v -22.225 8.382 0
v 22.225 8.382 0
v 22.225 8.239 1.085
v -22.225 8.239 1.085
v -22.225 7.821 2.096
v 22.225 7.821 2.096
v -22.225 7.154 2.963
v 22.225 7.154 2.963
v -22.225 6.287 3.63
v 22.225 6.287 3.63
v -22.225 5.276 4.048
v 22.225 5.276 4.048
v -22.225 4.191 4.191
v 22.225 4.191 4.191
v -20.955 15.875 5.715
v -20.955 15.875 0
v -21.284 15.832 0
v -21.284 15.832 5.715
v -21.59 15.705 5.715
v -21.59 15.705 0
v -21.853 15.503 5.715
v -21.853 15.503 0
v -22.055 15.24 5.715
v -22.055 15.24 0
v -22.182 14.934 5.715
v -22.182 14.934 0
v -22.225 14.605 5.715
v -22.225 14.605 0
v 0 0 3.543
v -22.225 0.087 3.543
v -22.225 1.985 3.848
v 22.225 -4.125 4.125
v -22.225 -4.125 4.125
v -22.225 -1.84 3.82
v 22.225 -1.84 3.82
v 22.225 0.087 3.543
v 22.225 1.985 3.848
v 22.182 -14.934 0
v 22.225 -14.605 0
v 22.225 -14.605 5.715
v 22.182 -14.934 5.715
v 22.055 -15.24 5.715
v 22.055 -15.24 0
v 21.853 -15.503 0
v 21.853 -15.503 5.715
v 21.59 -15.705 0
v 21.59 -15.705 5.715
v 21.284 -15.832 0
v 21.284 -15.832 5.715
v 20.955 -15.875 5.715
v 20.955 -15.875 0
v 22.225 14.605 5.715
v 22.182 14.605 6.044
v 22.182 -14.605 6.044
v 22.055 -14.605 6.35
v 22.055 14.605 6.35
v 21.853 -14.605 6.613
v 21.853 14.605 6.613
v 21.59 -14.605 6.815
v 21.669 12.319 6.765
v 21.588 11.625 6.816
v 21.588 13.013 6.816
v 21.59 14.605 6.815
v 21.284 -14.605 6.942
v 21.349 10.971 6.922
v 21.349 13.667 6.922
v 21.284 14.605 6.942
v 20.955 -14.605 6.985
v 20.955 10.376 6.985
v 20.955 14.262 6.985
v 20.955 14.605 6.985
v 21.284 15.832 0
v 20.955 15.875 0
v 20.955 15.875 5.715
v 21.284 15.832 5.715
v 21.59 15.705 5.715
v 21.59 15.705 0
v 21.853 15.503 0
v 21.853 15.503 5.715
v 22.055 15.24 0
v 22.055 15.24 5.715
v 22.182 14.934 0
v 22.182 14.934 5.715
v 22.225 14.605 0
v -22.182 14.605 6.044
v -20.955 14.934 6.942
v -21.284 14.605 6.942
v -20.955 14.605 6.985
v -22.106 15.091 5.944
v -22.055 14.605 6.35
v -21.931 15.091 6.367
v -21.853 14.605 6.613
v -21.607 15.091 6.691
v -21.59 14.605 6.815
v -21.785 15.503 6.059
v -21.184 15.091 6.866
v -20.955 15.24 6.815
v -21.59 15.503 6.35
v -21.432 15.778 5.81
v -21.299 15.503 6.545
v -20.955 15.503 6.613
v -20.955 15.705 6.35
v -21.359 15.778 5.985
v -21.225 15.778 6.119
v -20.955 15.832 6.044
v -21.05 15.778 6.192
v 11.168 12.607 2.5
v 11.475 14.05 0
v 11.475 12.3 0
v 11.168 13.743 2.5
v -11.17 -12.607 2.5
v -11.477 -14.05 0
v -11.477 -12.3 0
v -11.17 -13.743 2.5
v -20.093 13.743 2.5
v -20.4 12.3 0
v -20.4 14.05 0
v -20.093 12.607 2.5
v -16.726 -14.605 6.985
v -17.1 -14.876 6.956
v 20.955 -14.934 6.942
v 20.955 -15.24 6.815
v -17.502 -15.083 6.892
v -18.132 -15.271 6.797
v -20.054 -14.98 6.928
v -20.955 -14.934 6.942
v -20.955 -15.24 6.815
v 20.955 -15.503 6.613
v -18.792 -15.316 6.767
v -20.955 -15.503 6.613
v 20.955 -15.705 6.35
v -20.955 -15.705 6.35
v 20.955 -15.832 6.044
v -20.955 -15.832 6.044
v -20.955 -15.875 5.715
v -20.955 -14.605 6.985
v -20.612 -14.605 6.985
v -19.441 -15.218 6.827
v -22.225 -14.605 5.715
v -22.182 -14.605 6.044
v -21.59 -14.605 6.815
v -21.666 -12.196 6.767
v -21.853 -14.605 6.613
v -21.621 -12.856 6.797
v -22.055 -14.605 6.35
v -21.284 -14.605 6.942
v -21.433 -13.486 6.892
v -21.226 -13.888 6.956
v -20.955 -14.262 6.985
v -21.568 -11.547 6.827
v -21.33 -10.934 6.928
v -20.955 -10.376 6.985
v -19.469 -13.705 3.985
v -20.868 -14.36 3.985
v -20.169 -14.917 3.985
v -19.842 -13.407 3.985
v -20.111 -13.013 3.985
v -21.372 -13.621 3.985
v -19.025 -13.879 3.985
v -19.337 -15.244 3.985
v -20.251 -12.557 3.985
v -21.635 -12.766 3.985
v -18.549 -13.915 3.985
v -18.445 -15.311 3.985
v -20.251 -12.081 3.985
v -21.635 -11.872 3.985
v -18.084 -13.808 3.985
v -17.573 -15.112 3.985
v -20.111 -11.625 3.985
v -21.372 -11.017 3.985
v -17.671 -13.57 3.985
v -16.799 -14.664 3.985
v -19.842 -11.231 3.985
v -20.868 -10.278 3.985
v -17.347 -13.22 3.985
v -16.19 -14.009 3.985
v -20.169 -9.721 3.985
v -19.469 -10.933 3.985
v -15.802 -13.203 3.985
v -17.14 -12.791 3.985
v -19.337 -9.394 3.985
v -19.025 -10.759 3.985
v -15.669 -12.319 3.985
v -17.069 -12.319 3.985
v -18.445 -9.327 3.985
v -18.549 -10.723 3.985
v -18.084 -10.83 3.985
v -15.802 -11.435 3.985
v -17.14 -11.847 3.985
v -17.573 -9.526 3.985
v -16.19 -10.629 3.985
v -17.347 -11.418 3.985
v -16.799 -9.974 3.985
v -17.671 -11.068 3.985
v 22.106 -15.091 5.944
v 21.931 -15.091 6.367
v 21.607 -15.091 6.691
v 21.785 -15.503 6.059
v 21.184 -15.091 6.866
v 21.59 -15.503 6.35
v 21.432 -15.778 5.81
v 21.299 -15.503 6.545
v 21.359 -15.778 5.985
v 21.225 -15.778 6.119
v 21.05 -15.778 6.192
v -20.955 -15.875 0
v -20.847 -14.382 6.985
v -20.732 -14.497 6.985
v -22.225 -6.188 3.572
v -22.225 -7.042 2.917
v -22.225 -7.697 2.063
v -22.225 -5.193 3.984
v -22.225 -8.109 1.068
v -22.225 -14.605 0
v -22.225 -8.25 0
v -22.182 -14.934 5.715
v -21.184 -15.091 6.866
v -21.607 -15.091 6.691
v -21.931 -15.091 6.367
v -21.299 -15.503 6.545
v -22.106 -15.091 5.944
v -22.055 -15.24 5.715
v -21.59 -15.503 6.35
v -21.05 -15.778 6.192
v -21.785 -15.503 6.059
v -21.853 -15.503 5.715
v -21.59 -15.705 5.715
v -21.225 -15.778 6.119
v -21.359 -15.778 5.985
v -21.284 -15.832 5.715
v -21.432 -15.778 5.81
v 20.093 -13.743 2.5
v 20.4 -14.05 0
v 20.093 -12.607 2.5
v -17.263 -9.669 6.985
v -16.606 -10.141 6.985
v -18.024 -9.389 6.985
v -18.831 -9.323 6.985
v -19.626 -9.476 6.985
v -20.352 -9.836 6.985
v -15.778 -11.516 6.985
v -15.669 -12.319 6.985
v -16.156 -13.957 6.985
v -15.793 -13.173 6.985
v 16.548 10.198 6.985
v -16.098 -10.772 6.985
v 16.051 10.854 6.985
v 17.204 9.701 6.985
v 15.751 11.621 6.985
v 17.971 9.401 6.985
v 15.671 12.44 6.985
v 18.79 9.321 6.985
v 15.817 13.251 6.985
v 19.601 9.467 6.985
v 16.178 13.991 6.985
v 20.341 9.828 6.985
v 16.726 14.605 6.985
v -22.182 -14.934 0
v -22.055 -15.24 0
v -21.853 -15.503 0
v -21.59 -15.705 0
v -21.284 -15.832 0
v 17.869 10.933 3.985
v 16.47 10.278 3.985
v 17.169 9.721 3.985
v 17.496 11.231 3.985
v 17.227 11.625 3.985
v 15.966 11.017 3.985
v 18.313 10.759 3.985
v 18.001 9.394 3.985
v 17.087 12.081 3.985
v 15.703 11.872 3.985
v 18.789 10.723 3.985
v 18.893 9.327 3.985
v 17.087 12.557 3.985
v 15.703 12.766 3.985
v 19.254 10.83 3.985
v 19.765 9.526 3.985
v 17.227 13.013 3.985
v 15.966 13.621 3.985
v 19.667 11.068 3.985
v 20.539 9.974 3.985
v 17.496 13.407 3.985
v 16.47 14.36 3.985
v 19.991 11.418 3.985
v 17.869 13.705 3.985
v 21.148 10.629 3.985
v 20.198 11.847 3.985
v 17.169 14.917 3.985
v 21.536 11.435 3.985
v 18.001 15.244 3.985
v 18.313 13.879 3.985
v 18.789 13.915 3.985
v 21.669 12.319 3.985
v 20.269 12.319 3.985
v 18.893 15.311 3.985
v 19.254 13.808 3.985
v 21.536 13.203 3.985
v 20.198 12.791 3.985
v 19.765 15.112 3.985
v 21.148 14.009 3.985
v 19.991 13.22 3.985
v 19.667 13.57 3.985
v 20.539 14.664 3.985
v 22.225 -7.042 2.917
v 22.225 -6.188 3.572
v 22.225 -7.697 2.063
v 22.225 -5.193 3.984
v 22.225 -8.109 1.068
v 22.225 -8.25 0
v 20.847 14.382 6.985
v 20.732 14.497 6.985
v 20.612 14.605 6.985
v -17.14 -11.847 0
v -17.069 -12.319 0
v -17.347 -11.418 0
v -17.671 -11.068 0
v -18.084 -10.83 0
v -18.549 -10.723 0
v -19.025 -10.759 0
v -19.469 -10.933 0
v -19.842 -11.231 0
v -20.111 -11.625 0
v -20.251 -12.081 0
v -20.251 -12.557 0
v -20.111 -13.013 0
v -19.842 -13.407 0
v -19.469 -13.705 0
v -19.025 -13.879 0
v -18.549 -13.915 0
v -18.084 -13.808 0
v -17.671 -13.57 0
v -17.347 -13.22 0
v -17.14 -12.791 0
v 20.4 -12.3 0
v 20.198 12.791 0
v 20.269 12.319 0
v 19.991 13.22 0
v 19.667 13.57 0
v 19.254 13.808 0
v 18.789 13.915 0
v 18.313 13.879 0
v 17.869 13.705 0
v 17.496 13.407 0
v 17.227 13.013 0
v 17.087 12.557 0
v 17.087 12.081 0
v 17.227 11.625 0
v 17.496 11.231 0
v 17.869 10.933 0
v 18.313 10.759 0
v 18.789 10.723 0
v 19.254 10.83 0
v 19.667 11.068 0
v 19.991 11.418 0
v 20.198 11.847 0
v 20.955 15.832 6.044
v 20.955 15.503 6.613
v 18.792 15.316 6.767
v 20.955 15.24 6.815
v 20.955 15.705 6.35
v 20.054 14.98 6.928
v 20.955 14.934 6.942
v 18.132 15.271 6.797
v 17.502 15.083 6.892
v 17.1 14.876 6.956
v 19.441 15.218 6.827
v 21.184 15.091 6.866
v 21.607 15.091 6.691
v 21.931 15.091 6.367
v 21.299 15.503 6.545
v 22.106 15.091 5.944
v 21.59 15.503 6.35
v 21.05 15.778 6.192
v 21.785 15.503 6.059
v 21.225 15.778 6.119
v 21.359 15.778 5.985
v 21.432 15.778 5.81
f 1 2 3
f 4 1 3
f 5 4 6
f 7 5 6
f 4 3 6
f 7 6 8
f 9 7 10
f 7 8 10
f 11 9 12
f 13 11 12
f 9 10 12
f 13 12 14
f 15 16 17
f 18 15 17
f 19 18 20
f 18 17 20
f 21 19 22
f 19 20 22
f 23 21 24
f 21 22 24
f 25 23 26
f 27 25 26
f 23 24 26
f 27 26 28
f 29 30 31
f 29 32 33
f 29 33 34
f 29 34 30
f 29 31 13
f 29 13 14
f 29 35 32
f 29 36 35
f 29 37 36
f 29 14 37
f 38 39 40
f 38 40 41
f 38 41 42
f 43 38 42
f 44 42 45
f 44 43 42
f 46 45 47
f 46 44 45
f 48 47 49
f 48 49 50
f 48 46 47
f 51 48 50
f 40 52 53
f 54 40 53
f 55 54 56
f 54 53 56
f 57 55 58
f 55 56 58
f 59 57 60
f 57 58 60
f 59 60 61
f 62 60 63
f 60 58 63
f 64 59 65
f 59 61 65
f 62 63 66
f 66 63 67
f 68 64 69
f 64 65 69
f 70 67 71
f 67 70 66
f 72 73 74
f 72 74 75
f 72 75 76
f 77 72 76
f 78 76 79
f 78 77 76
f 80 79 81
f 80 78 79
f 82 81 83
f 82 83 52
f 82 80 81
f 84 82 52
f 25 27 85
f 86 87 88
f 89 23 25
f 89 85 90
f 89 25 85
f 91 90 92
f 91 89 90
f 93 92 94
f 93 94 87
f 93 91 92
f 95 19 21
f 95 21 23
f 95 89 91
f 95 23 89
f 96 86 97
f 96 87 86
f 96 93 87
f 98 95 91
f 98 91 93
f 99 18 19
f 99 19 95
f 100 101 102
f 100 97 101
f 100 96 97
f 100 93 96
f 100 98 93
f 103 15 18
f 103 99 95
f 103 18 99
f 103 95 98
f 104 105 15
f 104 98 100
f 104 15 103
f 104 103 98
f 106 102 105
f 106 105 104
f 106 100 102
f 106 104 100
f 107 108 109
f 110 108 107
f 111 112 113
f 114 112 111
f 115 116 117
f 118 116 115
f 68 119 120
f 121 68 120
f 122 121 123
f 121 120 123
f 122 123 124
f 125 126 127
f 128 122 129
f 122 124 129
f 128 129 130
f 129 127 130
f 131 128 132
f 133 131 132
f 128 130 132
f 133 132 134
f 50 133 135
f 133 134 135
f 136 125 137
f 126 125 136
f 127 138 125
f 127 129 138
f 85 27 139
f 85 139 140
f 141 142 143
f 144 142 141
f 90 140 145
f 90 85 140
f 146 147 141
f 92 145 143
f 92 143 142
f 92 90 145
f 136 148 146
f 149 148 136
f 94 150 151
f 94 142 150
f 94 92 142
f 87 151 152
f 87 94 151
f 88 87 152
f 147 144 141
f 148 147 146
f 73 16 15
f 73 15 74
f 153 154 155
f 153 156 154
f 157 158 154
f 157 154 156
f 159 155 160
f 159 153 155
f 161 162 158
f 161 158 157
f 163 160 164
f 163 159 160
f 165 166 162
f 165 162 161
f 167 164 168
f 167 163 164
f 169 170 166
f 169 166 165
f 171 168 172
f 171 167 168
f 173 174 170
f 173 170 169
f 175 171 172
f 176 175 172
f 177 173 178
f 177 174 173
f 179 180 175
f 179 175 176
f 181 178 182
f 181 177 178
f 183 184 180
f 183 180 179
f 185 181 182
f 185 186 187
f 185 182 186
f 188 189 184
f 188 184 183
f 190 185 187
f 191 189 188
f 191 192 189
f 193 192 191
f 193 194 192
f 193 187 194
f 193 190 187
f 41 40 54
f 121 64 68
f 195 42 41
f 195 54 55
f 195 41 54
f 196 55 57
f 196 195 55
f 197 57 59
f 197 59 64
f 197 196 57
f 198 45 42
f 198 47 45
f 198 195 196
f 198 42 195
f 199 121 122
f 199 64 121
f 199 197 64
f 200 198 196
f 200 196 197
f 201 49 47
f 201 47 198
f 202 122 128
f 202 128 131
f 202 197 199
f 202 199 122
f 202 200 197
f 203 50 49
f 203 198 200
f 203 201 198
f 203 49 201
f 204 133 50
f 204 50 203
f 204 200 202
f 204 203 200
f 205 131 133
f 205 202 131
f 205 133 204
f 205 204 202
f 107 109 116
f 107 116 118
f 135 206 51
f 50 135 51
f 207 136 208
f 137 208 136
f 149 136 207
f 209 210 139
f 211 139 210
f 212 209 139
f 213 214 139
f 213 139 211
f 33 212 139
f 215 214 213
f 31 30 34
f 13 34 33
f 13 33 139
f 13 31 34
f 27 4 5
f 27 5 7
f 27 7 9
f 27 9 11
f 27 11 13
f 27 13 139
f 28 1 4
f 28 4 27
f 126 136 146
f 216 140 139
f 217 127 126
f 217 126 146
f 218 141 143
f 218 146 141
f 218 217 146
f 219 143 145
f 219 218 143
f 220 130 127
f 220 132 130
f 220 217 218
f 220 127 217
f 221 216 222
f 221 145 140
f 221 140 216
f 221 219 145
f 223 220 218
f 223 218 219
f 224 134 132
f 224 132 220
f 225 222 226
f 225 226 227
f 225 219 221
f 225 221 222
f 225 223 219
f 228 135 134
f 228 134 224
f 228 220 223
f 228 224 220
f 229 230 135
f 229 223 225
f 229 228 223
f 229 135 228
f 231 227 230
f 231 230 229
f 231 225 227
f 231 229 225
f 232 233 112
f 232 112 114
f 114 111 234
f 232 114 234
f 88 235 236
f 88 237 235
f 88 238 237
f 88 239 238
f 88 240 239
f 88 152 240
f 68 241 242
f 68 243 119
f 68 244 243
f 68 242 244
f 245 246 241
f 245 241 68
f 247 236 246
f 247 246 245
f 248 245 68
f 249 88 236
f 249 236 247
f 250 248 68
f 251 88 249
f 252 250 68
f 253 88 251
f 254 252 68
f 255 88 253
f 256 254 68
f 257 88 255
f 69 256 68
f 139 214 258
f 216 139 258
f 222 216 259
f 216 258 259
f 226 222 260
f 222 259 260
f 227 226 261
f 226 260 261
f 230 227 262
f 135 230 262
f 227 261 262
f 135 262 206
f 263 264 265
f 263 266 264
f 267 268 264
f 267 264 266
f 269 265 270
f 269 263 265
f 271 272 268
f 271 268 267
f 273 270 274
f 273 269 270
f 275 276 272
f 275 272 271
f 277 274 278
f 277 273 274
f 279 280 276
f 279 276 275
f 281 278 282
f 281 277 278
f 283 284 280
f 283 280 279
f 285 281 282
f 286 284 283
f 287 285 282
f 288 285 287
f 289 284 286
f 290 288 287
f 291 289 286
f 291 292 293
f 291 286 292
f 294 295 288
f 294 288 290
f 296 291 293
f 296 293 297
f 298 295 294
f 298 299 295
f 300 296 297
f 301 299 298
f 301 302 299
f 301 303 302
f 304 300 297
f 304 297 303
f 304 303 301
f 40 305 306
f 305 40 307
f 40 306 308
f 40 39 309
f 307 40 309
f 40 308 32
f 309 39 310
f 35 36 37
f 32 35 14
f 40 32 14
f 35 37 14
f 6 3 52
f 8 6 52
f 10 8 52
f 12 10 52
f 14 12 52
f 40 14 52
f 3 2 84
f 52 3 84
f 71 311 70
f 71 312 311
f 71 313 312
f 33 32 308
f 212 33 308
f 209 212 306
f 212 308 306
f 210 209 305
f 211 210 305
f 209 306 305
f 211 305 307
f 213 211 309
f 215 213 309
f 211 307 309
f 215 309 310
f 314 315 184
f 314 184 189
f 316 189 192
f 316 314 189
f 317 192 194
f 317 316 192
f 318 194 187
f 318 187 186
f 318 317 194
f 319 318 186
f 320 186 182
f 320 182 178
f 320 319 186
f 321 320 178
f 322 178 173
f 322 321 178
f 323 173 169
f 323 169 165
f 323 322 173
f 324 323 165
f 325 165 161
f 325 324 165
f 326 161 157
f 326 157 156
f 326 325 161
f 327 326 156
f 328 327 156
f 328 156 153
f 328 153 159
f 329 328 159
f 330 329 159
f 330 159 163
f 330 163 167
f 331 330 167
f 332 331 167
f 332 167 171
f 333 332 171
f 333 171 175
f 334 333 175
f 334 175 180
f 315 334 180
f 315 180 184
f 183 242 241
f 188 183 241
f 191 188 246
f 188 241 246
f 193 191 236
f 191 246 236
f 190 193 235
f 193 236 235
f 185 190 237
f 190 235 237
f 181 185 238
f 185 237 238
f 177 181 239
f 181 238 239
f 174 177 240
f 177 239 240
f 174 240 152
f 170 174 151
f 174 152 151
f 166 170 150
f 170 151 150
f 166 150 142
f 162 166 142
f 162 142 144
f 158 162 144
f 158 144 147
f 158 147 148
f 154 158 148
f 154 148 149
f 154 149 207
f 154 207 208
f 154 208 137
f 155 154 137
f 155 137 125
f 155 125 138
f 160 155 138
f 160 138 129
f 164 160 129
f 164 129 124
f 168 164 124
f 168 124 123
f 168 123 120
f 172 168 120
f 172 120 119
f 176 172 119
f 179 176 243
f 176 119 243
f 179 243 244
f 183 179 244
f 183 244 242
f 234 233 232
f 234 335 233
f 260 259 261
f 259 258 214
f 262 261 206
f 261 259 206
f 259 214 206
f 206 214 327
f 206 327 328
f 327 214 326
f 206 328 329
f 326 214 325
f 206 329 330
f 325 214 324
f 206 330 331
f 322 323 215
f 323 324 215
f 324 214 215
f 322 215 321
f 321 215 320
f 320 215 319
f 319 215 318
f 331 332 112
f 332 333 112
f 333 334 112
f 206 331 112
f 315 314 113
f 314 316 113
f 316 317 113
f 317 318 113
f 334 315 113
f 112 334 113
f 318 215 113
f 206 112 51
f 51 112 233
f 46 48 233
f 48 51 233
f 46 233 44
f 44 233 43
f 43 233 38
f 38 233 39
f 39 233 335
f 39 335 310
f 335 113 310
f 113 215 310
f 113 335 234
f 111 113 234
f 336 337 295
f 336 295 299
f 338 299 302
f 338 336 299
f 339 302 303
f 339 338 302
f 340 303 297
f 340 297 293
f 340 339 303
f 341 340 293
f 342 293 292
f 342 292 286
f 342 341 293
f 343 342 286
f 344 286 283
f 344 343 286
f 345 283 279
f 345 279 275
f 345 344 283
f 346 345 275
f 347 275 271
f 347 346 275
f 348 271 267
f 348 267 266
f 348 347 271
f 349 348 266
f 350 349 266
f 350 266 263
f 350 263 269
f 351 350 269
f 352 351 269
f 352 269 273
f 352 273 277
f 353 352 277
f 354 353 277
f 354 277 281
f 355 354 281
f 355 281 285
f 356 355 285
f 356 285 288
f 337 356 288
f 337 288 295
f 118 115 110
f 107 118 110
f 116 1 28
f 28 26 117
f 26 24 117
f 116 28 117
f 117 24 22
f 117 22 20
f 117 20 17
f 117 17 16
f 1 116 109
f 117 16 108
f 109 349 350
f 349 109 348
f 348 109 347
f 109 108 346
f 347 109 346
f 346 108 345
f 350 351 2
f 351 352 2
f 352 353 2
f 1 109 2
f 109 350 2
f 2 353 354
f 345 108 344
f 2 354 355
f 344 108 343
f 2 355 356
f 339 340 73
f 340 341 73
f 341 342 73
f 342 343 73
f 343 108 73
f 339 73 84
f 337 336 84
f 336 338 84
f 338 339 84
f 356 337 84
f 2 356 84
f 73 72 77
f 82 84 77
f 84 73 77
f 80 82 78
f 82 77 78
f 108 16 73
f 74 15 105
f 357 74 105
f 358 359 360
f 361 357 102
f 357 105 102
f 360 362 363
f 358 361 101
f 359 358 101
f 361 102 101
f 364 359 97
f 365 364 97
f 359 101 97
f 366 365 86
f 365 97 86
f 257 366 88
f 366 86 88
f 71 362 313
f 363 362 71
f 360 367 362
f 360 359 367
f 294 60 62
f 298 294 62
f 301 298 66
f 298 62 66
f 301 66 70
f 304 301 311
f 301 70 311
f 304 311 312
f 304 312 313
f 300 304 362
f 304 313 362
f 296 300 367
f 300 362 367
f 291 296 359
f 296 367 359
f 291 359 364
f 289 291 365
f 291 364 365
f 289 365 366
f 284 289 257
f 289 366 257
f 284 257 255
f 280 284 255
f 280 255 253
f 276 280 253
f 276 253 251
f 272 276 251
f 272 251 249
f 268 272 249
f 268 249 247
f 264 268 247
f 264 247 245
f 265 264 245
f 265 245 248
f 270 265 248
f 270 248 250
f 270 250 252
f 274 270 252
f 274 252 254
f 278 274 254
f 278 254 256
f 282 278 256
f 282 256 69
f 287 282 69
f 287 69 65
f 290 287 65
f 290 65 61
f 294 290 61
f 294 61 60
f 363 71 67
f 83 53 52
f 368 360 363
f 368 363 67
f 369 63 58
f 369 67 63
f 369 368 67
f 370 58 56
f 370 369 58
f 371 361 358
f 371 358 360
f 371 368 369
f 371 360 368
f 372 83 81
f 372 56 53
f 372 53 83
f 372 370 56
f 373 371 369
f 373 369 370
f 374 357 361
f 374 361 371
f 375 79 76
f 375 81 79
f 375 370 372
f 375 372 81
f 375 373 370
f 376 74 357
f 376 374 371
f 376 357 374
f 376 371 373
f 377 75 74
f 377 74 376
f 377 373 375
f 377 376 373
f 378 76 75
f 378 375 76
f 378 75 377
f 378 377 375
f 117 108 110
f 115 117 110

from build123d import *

# Parameters (mm, degrees)
F1_W          = 44.45
F1_H          = 31.75
F2_DEPTH      = 6.985
F4_DEPTH      = 44.45
F6_W          = 31.875
F6_H          = 1.75
F6_W_2        = 31.877
F7_DEPTH      = 2.5
F7_TAPER      = 7
F5_R          = 1.6
F8_DEPTH      = 25.4
F9_R          = 3
F9_R_2        = 1.6
F10_DEPTH     = 3
F11_T1_DEPTH  = 29.21
F11_T3_DEPTH  = 8.89
F11_T5_DEPTH  = 41.91
F11_S9_W      = 1.27
F11_S9_H      = 1.27
F11_T10_DEPTH = 1.27
F11_S15_W     = 1.27
F11_S15_H     = 1.27
F11_T16_DEPTH = 1.27
F11_S21_W     = 1.27
F11_S21_H     = 1.27
F11_T22_DEPTH = 1.27
F11_S27_W     = 1.27
F11_S27_H     = 1.27
F11_T28_DEPTH = 1.27


# Not quite as in the source:
# - a fillet or chamfer that OpenCascade refuses, or shapes differently, is made with other operations: its cross-section is extruded or revolved along the edge and cut away or added


with BuildPart() as f2:
    # F1 (on Top) → F2 (new body)
    with BuildSketch(Plane.XY):
        Rectangle(F1_W, F1_H)
    extrude(amount=F2_DEPTH)

    # F3 (on face) → F4 (cut, through all)
    with BuildSketch(Plane.YZ.offset(22.225)):
        with BuildLine():
            add(Edge.make_bspline(
                [(-4.125, 4.125), (-2.4255892558, 4.1137489608), (-0.0276085061, 2.971292738), (2.5249406681, 4.1137612248), (4.191, 4.191)],
                knots=[0, 0, 0, 0, 0.4977710734, 1, 1, 1, 1], degree=3))
            ThreePointArc((-4.125, 4.125), (-7.0418154724, 2.9168154724), (-8.25, 0))
            ThreePointArc((-8.25, 0), (-7.0418154724, -2.9168154724), (-4.125, -4.125))
            add(Edge.make_bspline(
                [(-4.125, -4.125), (-2.9335741419, -4.2006121948), (0.4172014685, -3.0581585459), (2.1438994445, -4.2006121948), (4.191, -4.191)],
                knots=[0, 0, 0, 0, 0.497799261, 1, 1, 1, 1], degree=3))
            ThreePointArc((4.191, -4.191), (7.15448452, -2.96348452), (8.382, 0))
            ThreePointArc((8.382, 0), (7.15448452, 2.96348452), (4.191, 4.191))
        make_face()
    extrude(amount=-F4_DEPTH, mode=Mode.SUBTRACT)

    # F6 (on Top) → F7 (cut)
    with BuildSketch(Plane.XY):
        with Locations((-4.4625, 13.175)):
            Rectangle(F6_W, F6_H)
        with Locations((4.4615, -13.175)):
            Rectangle(F6_W_2, F6_H)
    extrude(amount=F7_DEPTH, taper=F7_TAPER, mode=Mode.SUBTRACT)

    # F5 (on Top) → F8 (cut)
    with BuildSketch(Plane.XY):
        with Locations((-18.669, -12.319)):
            Circle(F5_R)
        with Locations((18.669, 12.319)):
            Circle(F5_R)
    extrude(amount=F8_DEPTH, mode=Mode.SUBTRACT)

    # F9 (on face) → F10 (cut)
    with BuildSketch(Plane.XY.offset(6.985)):
        with Locations((-18.669, -12.319)):
            Circle(F9_R)
        with Locations((-18.669, -12.319)):
            Circle(F9_R_2, mode=Mode.SUBTRACT)
        with Locations((18.669, 12.319)):
            Circle(F9_R)
        with Locations((18.669, 12.319)):
            Circle(F9_R_2, mode=Mode.SUBTRACT)
    extrude(amount=-F10_DEPTH, mode=Mode.SUBTRACT)

    # F11: fillet of radius 1.27 on 8 edges, made by hand

    # F11_s2 → F11_t1 (cut)
    with BuildSketch(Plane.XZ.offset(-14.605)):
        with BuildLine():
            ThreePointArc((-22.225, 5.715), (-21.8530256121, 6.6130256121), (-20.955, 6.985))
            Line((-20.955, 6.985), (-22.225, 6.985))
            Line((-22.225, 6.985), (-22.225, 5.715))
        make_face()
        with BuildLine():
            ThreePointArc((22.225, 5.715), (21.8530256121, 6.6130256121), (20.955, 6.985))
            Line((20.955, 6.985), (22.225, 6.985))
            Line((22.225, 6.985), (22.225, 5.715))
        make_face()
    extrude(amount=F11_T1_DEPTH, mode=Mode.SUBTRACT)

    # F11_s4 → F11_t3 (cut)
    with BuildSketch(Plane.XY.offset(-3.175)):
        with BuildLine():
            ThreePointArc((-22.225, -14.605), (-21.8530256121, -15.5030256121), (-20.955, -15.875))
            Line((-20.955, -15.875), (-22.225, -15.875))
            Line((-22.225, -15.875), (-22.225, -14.605))
        make_face()
        with BuildLine():
            ThreePointArc((22.225, -14.605), (21.8530256121, -15.5030256121), (20.955, -15.875))
            Line((20.955, -15.875), (22.225, -15.875))
            Line((22.225, -15.875), (22.225, -14.605))
        make_face()
        with BuildLine():
            ThreePointArc((20.955, 15.875), (21.8530256121, 15.5030256121), (22.225, 14.605))
            Line((22.225, 14.605), (22.225, 15.875))
            Line((22.225, 15.875), (20.955, 15.875))
        make_face()
        with BuildLine():
            ThreePointArc((-20.955, 15.875), (-21.8530256121, 15.5030256121), (-22.225, 14.605))
            Line((-22.225, 14.605), (-22.225, 15.875))
            Line((-22.225, 15.875), (-20.955, 15.875))
        make_face()
    extrude(amount=F11_T3_DEPTH, mode=Mode.SUBTRACT)

    # F11_s6 → F11_t5 (cut)
    with BuildSketch(Plane.YZ.offset(-20.955)):
        with BuildLine():
            ThreePointArc((-14.605, 6.985), (-15.5030256121, 6.6130256121), (-15.875, 5.715))
            Line((-15.875, 5.715), (-15.875, 6.985))
            Line((-15.875, 6.985), (-14.605, 6.985))
        make_face()
        with BuildLine():
            ThreePointArc((15.875, 5.715), (15.5030256121, 6.6130256121), (14.605, 6.985))
            Line((14.605, 6.985), (15.875, 6.985))
            Line((15.875, 6.985), (15.875, 5.715))
        make_face()
    extrude(amount=F11_T5_DEPTH, mode=Mode.SUBTRACT)


with BuildPart() as f11_tool8:
    # F11_s9 → F11_t10 (new body)
    with BuildSketch(Plane.XZ.offset(-14.605)):
        with Locations((-21.59, 6.35)):
            Rectangle(F11_S9_W, F11_S9_H)
    extrude(amount=-F11_T10_DEPTH)

    # F11_s11 → F11_t12 (revolve, cut)
    with BuildSketch(Plane(origin=(-20.955, 14.605, 5.715), x_dir=(0.7071067812, 0, -0.7071067812), z_dir=(0.7071067812, 0, 0.7071067812))):
        with BuildLine():
            ThreePointArc((0, -1.27), (1.27, 0), (0, 1.27))
            Line((0, 1.27), (0, -1.27))
        make_face()
    revolve(axis=Axis((-20.955, 14.605, 5.715), (0, 1, 0)), mode=Mode.SUBTRACT)


with BuildPart() as f2_1:
    add(f2.part)

    # F11_t7: cut F11_tool8
    add(f11_tool8.part, mode=Mode.SUBTRACT)


with BuildPart() as f11_tool14:
    # F11_s15 → F11_t16 (new body)
    with BuildSketch(Plane.XZ.offset(14.605)):
        with Locations((-21.59, 6.35)):
            Rectangle(F11_S15_W, F11_S15_H)
    extrude(amount=F11_T16_DEPTH)

    # F11_s17 → F11_t18 (revolve, cut)
    with BuildSketch(Plane(origin=(-20.955, -14.605, 5.715), x_dir=(0.7071067812, 0, -0.7071067812), z_dir=(-0.7071067812, 0, -0.7071067812))):
        with BuildLine():
            ThreePointArc((0, -1.27), (1.27, 0), (0, 1.27))
            Line((0, 1.27), (0, -1.27))
        make_face()
    revolve(axis=Axis((-20.955, -14.605, 5.715), (0, -1, 0)), mode=Mode.SUBTRACT)


with BuildPart() as f2_2:
    add(f2_1.part)

    # F11_t13: cut F11_tool14
    add(f11_tool14.part, mode=Mode.SUBTRACT)


with BuildPart() as f11_tool20:
    # F11_s21 → F11_t22 (new body)
    with BuildSketch(Plane.XZ.offset(14.605)):
        with Locations((21.59, 6.35)):
            Rectangle(F11_S21_W, F11_S21_H)
    extrude(amount=F11_T22_DEPTH)

    # F11_s23 → F11_t24 (revolve, cut)
    with BuildSketch(Plane(origin=(20.955, -14.605, 5.715), x_dir=(-0.7071067812, 0, -0.7071067812), z_dir=(-0.7071067812, 0, 0.7071067812))):
        with BuildLine():
            ThreePointArc((0, -1.27), (1.27, 0), (0, 1.27))
            Line((0, 1.27), (0, -1.27))
        make_face()
    revolve(axis=Axis((20.955, -14.605, 5.715), (0, -1, 0)), mode=Mode.SUBTRACT)


with BuildPart() as f2_3:
    add(f2_2.part)

    # F11_t19: cut F11_tool20
    add(f11_tool20.part, mode=Mode.SUBTRACT)


with BuildPart() as f11_tool26:
    # F11_s27 → F11_t28 (new body)
    with BuildSketch(Plane.XZ.offset(-14.605)):
        with Locations((21.59, 6.35)):
            Rectangle(F11_S27_W, F11_S27_H)
    extrude(amount=-F11_T28_DEPTH)

    # F11_s29 → F11_t30 (revolve, cut)
    with BuildSketch(Plane(origin=(20.955, 14.605, 5.715), x_dir=(-0.7071067812, 0, -0.7071067812), z_dir=(0.7071067812, 0, -0.7071067812))):
        with BuildLine():
            ThreePointArc((0, -1.27), (1.27, 0), (0, 1.27))
            Line((0, 1.27), (0, -1.27))
        make_face()
    revolve(axis=Axis((20.955, 14.605, 5.715), (0, 1, 0)), mode=Mode.SUBTRACT)


with BuildPart() as f2_4:
    add(f2_3.part)

    # F11_t25: cut F11_tool26
    add(f11_tool26.part, mode=Mode.SUBTRACT)


solid = f2_4.part
